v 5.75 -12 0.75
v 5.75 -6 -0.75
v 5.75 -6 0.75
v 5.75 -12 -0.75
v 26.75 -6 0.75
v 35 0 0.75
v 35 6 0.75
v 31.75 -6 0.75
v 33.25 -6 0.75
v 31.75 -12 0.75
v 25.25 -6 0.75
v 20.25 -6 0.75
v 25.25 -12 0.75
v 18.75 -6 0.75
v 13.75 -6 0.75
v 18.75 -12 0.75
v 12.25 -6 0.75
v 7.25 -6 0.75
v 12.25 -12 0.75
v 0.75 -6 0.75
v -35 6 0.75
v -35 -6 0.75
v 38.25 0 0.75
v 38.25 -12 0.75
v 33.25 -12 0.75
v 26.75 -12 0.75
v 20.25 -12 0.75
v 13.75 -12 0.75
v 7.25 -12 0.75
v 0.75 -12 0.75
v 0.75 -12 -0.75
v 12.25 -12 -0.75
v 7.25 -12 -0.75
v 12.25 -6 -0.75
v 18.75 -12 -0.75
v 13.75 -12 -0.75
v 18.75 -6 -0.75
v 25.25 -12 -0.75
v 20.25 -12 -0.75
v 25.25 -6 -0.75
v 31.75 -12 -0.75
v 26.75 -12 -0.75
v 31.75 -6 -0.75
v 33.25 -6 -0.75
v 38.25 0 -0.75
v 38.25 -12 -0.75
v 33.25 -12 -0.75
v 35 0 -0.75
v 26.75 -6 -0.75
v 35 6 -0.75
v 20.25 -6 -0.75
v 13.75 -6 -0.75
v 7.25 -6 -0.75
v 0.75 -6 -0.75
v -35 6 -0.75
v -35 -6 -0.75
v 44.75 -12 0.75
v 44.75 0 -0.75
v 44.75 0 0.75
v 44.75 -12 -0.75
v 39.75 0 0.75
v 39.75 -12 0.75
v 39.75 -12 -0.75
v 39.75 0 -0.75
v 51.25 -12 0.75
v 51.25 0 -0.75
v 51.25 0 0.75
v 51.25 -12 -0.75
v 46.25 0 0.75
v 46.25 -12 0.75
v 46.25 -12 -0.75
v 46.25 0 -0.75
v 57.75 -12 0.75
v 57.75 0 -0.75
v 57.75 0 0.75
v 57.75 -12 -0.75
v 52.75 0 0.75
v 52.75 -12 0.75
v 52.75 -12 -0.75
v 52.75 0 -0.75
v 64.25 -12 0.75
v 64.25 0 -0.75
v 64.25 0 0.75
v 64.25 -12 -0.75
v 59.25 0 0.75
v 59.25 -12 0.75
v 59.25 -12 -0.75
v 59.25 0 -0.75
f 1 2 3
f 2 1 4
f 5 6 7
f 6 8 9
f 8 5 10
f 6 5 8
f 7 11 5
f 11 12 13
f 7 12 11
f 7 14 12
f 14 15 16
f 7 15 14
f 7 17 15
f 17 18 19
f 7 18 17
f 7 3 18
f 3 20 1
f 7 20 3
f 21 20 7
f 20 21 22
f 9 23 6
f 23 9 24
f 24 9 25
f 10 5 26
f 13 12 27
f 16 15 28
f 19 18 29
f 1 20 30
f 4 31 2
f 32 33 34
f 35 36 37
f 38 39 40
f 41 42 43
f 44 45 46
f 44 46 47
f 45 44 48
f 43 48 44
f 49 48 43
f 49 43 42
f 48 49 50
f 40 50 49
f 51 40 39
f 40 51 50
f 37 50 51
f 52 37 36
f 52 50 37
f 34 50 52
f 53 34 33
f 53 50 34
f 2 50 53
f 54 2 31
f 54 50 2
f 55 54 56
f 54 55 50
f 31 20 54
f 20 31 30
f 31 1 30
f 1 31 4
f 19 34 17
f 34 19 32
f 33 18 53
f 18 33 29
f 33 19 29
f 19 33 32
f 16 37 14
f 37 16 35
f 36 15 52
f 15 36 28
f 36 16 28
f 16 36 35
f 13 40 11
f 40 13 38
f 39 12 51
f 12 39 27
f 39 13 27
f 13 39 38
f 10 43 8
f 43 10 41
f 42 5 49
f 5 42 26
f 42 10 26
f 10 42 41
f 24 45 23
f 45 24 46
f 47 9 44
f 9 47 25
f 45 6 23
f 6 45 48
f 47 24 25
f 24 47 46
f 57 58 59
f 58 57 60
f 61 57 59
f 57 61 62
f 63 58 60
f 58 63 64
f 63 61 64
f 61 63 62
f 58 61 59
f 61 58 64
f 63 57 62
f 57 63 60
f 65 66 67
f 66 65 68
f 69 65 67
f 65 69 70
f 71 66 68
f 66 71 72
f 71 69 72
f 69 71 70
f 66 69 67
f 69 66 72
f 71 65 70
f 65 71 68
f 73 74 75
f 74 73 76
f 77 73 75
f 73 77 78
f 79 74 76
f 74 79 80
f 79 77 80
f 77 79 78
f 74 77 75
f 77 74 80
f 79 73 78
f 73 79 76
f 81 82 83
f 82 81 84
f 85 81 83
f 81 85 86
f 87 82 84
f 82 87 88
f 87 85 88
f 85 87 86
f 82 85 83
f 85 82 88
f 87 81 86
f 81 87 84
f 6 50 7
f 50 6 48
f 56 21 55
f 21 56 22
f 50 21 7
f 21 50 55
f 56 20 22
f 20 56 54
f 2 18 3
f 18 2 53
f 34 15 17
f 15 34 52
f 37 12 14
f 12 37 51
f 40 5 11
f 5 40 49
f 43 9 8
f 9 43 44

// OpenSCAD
// Dimensions for the 10-well agarose gel comb
// All measurements in millimetres

// Overall dimensions
comb_length = 70;    // Length of the spine (X)
comb_width = 12;     // Width of the spine (Y)
comb_thickness = 1.5;// Thickness of the plate (Z)

// Tooth dimensions
tooth_length = 12;   // Length of the tooth (Y)
tooth_width = 5.0;   // Width of the tooth (X)

// Spacing and positioning
tooth_gap = 1.5;     // Gap between teeth (Y)
num_teeth = 10;      // Number of teeth
spine_center_offset = (comb_length - (num_teeth * tooth_width + (num_teeth - 1) * tooth_gap)) / 2;

$fn = 64; // High resolution for curved surfaces

// Main body of the comb (Spine)
module spine() {
    // The spine is a rectangular block centered on the origin
    // We subtract the teeth area later to create the holes
    cube([comb_length, comb_width, comb_thickness], center=true);
}

// Individual Tooth
module tooth() {
    // Teeth are centered on the spine in X
    // They extend in the -Y direction
    translate([0, -tooth_length/2, 0])
    cube([tooth_width, tooth_length, comb_thickness], center=true);
}

// Build the comb
module gel_comb() {
    union() {
        spine();
        
        // Generate teeth grid
        for (i = [0 : num_teeth - 1]) {
            // Calculate X position based on spine centering
            // Spacing logic: Center + (i * (tooth_width + gap))
            translate([spine_center_offset + (i * (tooth_width + tooth_gap)), 0, 0]) {
                tooth();
            }
        }
    }
}

// Render the part
gel_comb();
